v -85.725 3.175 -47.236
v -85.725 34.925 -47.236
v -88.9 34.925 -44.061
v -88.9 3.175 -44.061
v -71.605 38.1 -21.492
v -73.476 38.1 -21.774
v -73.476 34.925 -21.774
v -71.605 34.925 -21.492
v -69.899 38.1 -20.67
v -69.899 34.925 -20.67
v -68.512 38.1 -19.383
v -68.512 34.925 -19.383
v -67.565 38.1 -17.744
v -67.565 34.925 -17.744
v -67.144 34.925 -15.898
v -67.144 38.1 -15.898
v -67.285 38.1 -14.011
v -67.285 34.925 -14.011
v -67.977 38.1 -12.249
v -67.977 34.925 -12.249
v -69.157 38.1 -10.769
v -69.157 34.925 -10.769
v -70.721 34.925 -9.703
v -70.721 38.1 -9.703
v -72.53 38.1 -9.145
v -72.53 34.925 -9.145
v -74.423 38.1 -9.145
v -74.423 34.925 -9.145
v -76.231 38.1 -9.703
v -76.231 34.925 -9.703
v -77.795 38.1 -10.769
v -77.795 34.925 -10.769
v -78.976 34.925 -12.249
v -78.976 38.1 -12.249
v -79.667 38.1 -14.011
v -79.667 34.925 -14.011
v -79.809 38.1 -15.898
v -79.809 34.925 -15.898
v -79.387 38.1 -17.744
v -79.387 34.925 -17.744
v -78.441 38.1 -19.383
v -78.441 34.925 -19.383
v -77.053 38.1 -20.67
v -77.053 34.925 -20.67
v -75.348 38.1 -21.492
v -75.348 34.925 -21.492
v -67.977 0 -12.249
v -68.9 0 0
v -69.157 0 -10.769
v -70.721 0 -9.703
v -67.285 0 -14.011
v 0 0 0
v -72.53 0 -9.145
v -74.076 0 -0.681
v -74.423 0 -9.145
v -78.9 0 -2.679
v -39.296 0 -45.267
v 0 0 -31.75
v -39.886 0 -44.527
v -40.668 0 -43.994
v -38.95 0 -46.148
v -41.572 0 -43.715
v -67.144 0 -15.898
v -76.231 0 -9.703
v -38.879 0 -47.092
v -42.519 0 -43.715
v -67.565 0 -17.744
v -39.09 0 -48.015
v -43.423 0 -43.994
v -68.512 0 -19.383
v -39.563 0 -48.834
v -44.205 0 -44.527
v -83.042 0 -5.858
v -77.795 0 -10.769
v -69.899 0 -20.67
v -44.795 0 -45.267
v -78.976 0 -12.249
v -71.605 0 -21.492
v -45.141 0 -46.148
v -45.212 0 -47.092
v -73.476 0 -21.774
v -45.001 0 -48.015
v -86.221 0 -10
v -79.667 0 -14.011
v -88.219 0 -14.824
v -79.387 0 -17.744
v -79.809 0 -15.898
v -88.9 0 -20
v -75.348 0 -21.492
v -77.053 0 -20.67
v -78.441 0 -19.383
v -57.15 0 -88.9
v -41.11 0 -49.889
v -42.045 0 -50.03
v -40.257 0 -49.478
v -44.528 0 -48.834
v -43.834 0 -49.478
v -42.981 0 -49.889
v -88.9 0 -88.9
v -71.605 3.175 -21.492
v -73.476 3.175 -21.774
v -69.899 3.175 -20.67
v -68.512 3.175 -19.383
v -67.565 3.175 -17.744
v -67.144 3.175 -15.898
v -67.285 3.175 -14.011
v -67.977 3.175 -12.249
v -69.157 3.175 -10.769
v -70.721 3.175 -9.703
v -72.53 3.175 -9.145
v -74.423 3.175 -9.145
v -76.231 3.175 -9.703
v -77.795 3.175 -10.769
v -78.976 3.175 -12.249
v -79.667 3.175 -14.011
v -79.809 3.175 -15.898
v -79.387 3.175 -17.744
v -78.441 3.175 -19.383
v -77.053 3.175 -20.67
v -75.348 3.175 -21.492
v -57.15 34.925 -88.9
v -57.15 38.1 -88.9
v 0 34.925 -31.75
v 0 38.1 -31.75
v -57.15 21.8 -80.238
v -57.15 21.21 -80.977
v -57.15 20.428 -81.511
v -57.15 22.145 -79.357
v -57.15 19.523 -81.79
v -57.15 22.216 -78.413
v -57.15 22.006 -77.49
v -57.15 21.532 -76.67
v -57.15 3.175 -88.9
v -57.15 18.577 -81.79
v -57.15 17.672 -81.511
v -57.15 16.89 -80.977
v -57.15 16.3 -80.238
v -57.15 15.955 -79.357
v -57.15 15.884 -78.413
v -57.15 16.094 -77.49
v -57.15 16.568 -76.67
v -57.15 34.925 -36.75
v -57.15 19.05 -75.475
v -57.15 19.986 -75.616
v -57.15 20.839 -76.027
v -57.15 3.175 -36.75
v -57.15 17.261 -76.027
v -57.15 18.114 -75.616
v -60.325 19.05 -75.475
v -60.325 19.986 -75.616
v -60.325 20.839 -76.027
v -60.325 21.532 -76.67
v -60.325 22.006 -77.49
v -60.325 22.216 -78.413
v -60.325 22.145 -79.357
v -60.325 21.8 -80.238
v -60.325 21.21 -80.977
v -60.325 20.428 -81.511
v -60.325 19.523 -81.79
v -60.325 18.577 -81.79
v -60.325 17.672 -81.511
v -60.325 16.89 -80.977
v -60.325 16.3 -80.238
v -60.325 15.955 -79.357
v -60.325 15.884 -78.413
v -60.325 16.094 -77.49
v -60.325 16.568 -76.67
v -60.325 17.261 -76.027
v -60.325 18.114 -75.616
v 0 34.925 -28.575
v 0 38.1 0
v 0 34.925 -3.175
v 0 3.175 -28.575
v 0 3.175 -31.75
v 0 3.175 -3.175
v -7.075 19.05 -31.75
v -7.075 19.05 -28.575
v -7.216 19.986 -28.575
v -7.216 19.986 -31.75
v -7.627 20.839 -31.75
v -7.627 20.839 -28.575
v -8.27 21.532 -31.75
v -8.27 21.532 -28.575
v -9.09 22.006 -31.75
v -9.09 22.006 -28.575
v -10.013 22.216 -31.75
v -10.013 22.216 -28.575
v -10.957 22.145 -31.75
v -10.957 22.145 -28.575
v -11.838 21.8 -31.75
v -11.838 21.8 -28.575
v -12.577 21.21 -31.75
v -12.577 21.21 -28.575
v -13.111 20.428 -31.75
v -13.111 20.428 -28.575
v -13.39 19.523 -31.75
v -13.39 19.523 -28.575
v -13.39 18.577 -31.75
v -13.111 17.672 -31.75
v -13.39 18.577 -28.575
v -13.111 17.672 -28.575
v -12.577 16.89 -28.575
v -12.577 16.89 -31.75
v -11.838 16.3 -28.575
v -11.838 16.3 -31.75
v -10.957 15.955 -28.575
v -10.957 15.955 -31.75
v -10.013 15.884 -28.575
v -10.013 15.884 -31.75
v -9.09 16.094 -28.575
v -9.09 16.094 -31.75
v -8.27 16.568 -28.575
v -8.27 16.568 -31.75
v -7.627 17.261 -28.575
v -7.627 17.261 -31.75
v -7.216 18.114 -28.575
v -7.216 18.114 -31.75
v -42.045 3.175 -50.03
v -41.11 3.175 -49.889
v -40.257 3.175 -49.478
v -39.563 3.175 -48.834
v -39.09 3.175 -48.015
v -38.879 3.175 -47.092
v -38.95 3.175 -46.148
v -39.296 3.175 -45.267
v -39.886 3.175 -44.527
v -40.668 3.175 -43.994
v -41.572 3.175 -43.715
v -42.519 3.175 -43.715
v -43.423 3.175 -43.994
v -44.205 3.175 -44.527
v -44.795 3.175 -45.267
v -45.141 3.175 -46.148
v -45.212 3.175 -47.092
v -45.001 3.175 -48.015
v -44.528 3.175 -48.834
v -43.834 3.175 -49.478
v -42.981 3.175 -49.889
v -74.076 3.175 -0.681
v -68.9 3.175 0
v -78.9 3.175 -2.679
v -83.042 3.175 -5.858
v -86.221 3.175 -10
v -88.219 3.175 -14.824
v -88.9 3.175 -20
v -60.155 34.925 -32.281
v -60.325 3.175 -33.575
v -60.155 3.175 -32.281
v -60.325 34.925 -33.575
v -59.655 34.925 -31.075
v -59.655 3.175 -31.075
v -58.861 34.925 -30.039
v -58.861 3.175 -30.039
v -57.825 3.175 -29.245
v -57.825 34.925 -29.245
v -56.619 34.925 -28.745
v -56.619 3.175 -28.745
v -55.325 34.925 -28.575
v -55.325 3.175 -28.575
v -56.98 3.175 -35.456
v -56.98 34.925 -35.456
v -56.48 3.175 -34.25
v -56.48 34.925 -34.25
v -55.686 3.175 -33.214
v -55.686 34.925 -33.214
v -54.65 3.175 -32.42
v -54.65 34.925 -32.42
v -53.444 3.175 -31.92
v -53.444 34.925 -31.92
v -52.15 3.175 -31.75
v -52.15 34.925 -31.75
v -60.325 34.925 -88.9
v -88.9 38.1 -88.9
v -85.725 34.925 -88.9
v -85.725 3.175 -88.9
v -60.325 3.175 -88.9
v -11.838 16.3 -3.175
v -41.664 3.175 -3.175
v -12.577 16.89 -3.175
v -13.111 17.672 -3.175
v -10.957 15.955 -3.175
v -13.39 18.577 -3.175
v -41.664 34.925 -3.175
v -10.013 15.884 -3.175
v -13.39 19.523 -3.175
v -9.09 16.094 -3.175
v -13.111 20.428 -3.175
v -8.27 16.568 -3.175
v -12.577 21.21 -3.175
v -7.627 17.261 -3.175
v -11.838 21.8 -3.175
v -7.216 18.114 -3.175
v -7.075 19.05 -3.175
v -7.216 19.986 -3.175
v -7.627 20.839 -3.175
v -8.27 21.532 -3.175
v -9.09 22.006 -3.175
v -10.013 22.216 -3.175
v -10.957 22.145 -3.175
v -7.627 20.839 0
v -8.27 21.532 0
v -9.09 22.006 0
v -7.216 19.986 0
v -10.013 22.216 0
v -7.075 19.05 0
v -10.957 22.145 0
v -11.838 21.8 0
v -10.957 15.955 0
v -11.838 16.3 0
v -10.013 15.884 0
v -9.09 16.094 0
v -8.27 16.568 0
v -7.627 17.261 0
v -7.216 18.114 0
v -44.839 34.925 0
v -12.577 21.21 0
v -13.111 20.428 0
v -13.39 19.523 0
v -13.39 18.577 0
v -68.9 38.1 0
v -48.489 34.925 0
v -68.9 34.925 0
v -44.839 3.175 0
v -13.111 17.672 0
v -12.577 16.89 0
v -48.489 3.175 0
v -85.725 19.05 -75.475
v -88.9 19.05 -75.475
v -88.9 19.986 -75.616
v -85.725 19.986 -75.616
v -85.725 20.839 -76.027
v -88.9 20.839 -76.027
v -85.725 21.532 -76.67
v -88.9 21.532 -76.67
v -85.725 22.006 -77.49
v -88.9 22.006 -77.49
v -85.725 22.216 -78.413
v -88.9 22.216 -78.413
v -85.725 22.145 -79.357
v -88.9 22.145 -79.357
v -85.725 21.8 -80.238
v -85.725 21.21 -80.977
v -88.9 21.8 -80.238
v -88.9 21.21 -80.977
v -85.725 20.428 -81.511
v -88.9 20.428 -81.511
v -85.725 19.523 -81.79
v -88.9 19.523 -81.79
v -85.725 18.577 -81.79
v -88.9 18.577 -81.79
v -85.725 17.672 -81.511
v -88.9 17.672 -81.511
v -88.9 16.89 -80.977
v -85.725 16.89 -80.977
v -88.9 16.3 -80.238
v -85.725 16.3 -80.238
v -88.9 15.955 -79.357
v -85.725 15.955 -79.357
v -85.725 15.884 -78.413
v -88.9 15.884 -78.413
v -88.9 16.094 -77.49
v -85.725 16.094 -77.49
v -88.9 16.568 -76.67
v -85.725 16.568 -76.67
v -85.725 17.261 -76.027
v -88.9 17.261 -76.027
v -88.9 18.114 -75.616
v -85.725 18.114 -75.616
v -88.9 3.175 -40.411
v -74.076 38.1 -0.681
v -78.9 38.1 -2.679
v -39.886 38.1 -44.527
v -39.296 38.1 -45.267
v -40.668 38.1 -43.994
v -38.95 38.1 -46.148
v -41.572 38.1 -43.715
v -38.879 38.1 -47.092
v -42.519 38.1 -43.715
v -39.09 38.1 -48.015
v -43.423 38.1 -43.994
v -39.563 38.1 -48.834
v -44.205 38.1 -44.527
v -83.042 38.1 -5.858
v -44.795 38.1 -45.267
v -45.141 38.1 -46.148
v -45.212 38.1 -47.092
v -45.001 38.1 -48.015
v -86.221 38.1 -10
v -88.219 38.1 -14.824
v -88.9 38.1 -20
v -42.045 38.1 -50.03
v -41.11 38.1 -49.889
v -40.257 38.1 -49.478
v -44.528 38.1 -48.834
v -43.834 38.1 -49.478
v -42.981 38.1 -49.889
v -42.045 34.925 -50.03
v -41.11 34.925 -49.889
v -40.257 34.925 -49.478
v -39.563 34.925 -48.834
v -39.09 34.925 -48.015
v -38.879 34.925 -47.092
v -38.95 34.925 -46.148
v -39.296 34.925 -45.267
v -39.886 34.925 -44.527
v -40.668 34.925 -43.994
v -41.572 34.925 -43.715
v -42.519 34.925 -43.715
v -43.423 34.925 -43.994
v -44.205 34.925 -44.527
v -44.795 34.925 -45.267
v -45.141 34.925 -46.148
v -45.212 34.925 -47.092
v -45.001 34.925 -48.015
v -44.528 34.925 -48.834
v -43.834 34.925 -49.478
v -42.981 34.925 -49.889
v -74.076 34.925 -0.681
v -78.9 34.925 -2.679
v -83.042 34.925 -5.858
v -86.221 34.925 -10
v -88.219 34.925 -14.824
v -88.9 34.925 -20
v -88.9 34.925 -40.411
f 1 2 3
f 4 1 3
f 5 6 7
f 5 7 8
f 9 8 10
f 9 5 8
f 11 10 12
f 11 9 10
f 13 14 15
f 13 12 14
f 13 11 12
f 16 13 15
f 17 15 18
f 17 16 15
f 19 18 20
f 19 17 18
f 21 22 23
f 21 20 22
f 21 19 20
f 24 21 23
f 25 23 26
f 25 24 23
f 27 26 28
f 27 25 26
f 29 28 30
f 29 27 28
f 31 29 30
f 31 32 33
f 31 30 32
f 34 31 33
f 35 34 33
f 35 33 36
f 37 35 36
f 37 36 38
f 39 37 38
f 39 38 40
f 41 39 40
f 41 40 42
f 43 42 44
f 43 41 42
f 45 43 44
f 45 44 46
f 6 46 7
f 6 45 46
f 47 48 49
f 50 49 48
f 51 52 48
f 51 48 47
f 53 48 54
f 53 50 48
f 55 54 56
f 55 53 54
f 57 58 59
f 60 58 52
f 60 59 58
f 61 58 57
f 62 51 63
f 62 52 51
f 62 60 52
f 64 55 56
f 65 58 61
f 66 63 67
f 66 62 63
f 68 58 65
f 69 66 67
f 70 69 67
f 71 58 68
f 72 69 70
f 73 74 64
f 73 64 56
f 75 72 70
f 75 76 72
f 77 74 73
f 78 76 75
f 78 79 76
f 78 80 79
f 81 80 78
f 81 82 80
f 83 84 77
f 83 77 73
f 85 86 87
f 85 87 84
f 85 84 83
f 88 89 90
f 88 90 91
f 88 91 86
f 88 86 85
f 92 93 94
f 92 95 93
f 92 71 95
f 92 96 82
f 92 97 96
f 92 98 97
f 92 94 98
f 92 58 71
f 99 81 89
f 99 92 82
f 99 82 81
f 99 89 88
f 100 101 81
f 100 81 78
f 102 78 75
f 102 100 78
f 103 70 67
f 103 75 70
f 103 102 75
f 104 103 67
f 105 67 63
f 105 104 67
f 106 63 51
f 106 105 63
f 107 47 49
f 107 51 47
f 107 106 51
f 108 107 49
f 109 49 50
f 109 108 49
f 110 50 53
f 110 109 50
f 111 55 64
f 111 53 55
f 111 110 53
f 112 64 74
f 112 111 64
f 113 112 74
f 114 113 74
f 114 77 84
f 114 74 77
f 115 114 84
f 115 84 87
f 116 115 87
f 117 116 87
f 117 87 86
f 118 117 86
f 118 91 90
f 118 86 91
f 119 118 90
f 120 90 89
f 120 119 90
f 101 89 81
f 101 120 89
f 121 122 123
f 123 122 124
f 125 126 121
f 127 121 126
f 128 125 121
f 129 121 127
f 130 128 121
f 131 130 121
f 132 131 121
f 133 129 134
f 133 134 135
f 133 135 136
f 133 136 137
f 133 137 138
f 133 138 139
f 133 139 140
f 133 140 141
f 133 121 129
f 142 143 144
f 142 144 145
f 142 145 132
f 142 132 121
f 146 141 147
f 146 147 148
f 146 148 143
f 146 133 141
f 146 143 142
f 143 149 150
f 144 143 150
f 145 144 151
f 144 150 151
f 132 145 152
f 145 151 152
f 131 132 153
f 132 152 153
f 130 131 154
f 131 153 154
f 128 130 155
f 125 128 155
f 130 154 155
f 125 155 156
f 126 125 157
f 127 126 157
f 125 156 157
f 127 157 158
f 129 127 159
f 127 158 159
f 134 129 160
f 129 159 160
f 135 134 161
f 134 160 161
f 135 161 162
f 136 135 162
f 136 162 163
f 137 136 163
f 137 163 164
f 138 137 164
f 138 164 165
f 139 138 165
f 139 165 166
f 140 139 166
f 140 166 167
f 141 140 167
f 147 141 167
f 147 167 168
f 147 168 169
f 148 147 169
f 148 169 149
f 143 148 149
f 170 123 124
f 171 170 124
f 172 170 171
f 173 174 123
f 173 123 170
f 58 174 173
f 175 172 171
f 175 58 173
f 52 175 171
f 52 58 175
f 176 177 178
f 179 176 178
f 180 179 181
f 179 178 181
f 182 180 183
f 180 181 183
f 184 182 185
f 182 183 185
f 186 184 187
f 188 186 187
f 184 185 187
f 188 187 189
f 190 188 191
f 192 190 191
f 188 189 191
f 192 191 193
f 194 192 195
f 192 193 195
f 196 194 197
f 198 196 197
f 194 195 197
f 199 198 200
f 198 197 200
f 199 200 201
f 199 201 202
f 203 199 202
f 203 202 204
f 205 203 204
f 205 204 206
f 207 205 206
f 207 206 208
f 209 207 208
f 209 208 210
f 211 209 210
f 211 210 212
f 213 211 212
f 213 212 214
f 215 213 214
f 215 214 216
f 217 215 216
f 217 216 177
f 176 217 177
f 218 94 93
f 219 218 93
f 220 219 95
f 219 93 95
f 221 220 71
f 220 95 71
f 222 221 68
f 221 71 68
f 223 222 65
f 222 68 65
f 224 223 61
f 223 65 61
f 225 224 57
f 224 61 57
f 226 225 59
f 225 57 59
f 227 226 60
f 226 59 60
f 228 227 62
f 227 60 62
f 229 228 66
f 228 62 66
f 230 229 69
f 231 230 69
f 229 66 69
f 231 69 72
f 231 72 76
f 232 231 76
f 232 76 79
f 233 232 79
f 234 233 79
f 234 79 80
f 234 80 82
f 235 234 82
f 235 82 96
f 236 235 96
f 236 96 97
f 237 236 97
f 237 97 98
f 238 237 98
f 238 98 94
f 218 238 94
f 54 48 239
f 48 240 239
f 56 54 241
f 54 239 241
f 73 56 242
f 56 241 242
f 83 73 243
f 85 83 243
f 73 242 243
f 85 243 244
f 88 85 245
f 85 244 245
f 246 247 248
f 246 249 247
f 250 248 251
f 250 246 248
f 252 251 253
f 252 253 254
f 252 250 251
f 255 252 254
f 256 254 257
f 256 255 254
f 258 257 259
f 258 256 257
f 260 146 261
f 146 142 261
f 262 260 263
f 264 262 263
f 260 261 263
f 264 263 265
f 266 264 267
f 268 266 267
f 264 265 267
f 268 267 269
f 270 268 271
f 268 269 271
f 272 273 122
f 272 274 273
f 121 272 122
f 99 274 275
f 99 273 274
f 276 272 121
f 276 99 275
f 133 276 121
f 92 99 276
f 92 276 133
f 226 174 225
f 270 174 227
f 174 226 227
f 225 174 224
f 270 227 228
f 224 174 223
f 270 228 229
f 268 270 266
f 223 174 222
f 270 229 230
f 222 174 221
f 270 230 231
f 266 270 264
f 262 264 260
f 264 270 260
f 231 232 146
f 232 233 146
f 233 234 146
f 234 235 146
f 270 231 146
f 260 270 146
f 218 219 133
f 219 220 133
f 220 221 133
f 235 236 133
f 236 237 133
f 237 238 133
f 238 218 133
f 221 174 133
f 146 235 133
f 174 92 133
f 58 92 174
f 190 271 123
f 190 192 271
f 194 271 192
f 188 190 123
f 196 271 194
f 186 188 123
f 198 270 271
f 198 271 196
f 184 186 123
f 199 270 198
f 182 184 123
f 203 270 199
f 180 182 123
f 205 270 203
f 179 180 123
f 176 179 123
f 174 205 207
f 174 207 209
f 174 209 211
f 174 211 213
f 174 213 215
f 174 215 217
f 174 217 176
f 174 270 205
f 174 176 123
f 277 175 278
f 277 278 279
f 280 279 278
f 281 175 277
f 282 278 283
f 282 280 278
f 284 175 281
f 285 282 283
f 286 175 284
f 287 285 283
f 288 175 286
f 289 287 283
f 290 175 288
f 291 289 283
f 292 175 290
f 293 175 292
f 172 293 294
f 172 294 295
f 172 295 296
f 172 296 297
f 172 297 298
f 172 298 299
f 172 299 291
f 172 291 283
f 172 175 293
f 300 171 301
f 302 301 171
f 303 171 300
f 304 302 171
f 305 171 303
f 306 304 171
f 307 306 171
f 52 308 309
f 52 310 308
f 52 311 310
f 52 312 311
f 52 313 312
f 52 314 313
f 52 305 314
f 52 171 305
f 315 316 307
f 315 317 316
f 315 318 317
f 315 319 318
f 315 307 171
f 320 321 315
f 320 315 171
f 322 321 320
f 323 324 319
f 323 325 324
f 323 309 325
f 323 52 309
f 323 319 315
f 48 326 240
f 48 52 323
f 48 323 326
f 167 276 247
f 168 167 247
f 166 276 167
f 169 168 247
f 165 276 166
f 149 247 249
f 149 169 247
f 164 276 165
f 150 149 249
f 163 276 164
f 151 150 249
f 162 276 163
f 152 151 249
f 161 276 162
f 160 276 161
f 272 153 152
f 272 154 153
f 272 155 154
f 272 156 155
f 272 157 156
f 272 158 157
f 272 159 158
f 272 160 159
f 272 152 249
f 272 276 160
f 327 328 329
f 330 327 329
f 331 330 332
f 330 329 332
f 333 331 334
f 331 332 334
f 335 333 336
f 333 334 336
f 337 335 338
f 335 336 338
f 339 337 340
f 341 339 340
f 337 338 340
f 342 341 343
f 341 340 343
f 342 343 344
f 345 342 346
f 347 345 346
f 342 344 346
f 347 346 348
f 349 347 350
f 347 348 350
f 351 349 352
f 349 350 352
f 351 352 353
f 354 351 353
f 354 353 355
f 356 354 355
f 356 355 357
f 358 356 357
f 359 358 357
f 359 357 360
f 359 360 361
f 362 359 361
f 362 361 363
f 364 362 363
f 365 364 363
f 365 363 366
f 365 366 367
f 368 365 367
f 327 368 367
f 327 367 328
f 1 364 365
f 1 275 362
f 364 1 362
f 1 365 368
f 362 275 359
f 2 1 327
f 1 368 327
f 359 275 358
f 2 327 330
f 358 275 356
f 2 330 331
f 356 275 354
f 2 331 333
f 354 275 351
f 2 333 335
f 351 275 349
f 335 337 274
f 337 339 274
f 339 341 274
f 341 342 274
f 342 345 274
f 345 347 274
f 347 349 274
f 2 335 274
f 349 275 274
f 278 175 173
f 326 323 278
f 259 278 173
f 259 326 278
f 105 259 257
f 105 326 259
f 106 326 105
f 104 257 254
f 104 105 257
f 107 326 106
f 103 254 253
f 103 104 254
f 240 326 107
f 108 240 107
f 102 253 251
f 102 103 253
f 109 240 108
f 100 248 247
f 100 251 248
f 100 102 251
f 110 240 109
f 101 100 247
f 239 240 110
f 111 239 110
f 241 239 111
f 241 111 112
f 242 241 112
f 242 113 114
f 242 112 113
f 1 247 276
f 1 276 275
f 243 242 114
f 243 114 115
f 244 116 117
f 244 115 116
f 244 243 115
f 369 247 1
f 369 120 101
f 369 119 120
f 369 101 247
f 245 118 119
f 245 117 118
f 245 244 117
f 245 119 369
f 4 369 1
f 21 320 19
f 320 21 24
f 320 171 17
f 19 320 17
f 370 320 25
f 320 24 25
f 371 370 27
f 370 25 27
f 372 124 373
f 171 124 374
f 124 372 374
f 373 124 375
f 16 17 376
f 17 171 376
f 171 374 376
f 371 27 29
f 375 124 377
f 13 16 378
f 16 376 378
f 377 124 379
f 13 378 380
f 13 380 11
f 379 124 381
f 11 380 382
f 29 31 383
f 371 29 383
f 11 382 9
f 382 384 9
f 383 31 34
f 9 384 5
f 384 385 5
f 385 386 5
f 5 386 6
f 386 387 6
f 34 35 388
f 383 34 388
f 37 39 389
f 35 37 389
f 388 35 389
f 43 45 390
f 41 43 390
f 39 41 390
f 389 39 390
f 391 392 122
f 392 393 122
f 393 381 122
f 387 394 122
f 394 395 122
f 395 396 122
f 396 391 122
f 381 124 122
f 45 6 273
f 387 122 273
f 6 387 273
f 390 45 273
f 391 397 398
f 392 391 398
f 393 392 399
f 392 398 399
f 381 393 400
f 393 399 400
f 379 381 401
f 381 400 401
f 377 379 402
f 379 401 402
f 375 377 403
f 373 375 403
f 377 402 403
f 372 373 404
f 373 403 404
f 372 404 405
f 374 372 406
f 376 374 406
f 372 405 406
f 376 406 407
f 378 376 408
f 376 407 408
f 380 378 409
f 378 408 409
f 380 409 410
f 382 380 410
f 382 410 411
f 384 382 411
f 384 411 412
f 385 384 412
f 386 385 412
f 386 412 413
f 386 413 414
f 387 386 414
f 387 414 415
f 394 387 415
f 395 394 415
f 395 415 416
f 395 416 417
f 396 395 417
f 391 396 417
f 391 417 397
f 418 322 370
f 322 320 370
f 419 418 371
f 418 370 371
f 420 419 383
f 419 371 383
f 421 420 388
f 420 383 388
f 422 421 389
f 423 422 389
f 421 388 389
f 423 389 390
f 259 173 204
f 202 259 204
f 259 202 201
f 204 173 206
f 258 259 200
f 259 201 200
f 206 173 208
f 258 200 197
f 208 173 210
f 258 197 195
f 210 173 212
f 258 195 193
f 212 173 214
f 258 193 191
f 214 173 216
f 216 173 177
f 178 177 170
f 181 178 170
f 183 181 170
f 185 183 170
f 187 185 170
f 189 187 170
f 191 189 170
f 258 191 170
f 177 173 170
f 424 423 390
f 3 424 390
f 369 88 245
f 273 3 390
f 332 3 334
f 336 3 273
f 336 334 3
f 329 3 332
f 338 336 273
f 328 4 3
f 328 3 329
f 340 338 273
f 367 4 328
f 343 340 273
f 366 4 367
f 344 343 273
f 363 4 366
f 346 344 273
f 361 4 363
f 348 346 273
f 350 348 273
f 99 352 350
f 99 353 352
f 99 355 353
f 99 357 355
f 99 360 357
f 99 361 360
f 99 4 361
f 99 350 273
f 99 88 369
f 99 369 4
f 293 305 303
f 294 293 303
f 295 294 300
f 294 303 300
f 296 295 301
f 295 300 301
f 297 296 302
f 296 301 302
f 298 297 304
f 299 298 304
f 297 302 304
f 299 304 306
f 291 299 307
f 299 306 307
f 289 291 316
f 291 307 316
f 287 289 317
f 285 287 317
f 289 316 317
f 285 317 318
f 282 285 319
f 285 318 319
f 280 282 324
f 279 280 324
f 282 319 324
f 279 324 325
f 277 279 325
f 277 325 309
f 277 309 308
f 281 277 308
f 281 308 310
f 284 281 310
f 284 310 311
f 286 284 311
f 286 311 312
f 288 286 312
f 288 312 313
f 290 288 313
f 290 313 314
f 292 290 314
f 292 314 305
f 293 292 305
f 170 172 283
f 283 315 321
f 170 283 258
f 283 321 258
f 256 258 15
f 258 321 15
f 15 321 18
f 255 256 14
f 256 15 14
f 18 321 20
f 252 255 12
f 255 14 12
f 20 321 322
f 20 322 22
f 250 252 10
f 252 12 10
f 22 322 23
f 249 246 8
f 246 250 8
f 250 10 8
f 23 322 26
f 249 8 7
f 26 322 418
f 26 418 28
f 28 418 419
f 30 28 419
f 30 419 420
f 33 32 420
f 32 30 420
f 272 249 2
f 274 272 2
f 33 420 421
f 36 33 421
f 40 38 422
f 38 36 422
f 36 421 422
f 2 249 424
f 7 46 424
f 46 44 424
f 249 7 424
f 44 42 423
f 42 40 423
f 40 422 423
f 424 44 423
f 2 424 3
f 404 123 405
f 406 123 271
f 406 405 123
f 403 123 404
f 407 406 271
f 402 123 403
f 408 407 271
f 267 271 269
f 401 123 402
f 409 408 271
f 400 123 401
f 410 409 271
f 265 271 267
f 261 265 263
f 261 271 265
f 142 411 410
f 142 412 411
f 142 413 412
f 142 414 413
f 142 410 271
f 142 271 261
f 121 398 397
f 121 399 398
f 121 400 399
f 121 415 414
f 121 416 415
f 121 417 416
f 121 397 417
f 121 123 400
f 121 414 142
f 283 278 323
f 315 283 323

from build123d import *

# Parameters (mm, degrees)
BOSS_EXTRUDE1_DEPTH     = 38.1
SKETCH2_W               = 25.4
SKETCH2_H               = 31.75
CUT_EXTRUDE1_DEPTH      = 88.9
CUT_EXTRUDE2_REACH      = 133.37
SKETCH3_W               = 25.4
SKETCH3_H               = 31.75
CUT_EXTRUDE3_START      = -62.861793
SKETCH4_W               = 75
SKETCH4_H               = 31.75
CUT_EXTRUDE3_DEPTH      = 28.575
FILLET4_R               = 20
CUT_EXTRUDE8_DEPTH      = 131.484388453
CUT_EXTRUDE8_DEPTH_BACK = 131.484388453
SKETCH8_R               = 6.35
BOSS_EXTRUDE2_DEPTH     = 3.175
CUT_EXTRUDE10_REACH     = 133.37
SKETCH35_R              = 3.175
CUT_EXTRUDE11_REACH     = 133.37
SKETCH36_R              = 3.175
FILLET8_R               = 5
CHAMFER1_SIZE           = 10
CHAMFER1_SIZE_2         = 7.071067812
CUT_EXTRUDE12_REACH     = 133.37
SKETCH37_R              = 3.175


with BuildPart() as part:
    # Sketch1 → Boss-Extrude1 (new body)
    with BuildSketch(Plane(origin=(0, 0, 0), x_dir=(1, 0, 0), z_dir=(0, 1, 0))):
        Polygon((0, 0), (-88.9, 0), (-88.9, 88.9), (-57.15, 88.9), (-57.15, 31.75), (0, 31.75), align=None)
    extrude(amount=BOSS_EXTRUDE1_DEPTH)

    # Sketch2 → Cut-Extrude1 (cut)
    with BuildSketch(Plane(origin=(0, 0, 0), x_dir=(0, 0, -1), z_dir=(1, 0, 0))):
        with Locations((15.875, 19.05)):
            Rectangle(SKETCH2_W, SKETCH2_H)
    extrude(amount=-CUT_EXTRUDE1_DEPTH, mode=Mode.SUBTRACT)

    # Cut-Extrude2: up to this face of the body (flat: up to its plane)
    cut_extrude2_end = Plane(part.part.faces().sort_by_distance((-44.45, 19.05, 0))[0])
    # Sketch3 → Cut-Extrude2 (cut, up to the picked face)
    with BuildSketch(Plane(origin=(0, 0, -88.9), x_dir=(-1, 0, 0), z_dir=(0, 0, -1)), mode=Mode.PRIVATE) as cut_extrude2_sk1:
        with Locations((73.025, 19.05)):
            Rectangle(SKETCH3_W, SKETCH3_H)
    cut_extrude2_tool1 = split(extrude(cut_extrude2_sk1.sketch, amount=-CUT_EXTRUDE2_REACH, mode=Mode.PRIVATE), bisect_by=cut_extrude2_end, keep=Keep.BOTH, mode=Mode.PRIVATE)
    add(cut_extrude2_tool1.solids().sort_by(Axis((-73.025, 19.05, -88.9), (0, 0, 1)))[0], mode=Mode.SUBTRACT)

    # Sketch4 → Cut-Extrude3 (cut)
    with BuildSketch(Plane(origin=(0, 0, 0), x_dir=(-0.7071067811865475, 0, -0.7071067811865476), z_dir=(0.7071067811865476, 0, -0.7071067811865475)).offset(CUT_EXTRUDE3_START)):
        with Locations((62.861792847, 19.05)):
            Rectangle(SKETCH4_W, SKETCH4_H)
    extrude(amount=CUT_EXTRUDE3_DEPTH, mode=Mode.SUBTRACT)

    # Fillet4
    fillet4_edges = [part.edges().sort_by_distance(p)[0] for p in [
        (-88.9, 36.5125, 0),
        (-88.9, 1.5875, 0),
    ]]
    fillet(fillet4_edges, radius=FILLET4_R)

    # Sketch8 → Cut-Extrude8 (cut, two sides: drawn at the far end of the back side and taken through both)
    with BuildSketch(Plane.XZ.offset(-34.925).offset(-CUT_EXTRUDE8_DEPTH_BACK)):
        with Locations(Location((-73.476280605, -15.423719395, 0), (0, 0, 270))):
            Circle(SKETCH8_R)
    extrude(amount=CUT_EXTRUDE8_DEPTH + CUT_EXTRUDE8_DEPTH_BACK, mode=Mode.SUBTRACT)

    # Sketch29 → Boss-Extrude2 (add)
    with BuildSketch(Plane(origin=(0, 38.1, 0), x_dir=(1, 0, 0), z_dir=(0, 1, 0))):
        Polygon((-57.15, 88.9), (0, 31.75), (-57.15, 31.75), align=None)
    boss_extrude2 = extrude(amount=-BOSS_EXTRUDE2_DEPTH)

    # Cut-Extrude10: up to this face of the body (flat: up to its plane)
    cut_extrude10_end = Plane(part.part.faces().sort_by_distance((-57.15, 17.4625, -60.325))[0])
    # Sketch35 → Cut-Extrude10 (cut, up to the picked face)
    with BuildSketch(Plane.ZY.offset(88.9), mode=Mode.PRIVATE) as cut_extrude10_sk1:
        with Locations((-78.65, 19.05)):
            Circle(SKETCH35_R)
    cut_extrude10_tool1 = split(extrude(cut_extrude10_sk1.sketch, amount=-CUT_EXTRUDE10_REACH, mode=Mode.PRIVATE), bisect_by=cut_extrude10_end, keep=Keep.BOTH, mode=Mode.PRIVATE)
    add(cut_extrude10_tool1.solids().sort_by(Axis((-88.9, 19.05, -78.65), (1, 0, 0)))[0], mode=Mode.SUBTRACT)

    # Cut-Extrude11: up to this face of the body (flat: up to its plane)
    cut_extrude11_end = Plane(part.part.faces().sort_by_distance((-28.575, 17.4625, -31.75))[0])
    # Sketch36 → Cut-Extrude11 (cut, up to the picked face)
    with BuildSketch(Plane.XY, mode=Mode.PRIVATE) as cut_extrude11_sk1:
        with Locations((-10.25, 19.05)):
            Circle(SKETCH36_R)
    cut_extrude11_tool1 = split(extrude(cut_extrude11_sk1.sketch, amount=-CUT_EXTRUDE11_REACH, mode=Mode.PRIVATE), bisect_by=cut_extrude11_end, keep=Keep.BOTH, mode=Mode.PRIVATE)
    add(cut_extrude11_tool1.solids().sort_by(Axis((-10.25, 19.05, 0), (0, 0, -1)))[0], mode=Mode.SUBTRACT)

    # Mirror1: Boss-Extrude2 across plane
    add(boss_extrude2.mirror(Plane(origin=(0, 19.05, 0), x_dir=(0, 0, 1), z_dir=(0, -1, 0))))

    # Fillet8
    fillet8_edges = [part.edges().sort_by_distance(p)[0] for p in [
        (-57.15, 19.05, -31.75),
        (-60.325, 19.05, -28.575),
    ]]
    fillet(fillet8_edges, radius=FILLET8_R)

    # Chamfer1
    # the kernel refuses this chamfer: 10, 7.071067812 mm, written as the material it takes off along each edge
    with BuildSketch(Plane(origin=(-51.663847671, 3.175, -3.175), x_dir=(0.9996219169112968, 0, -0.027495876610586317), z_dir=(0, 1, 0)), Plane(origin=(-85.725, 34.925, -37.236152329), x_dir=(0.027495876610586317, 0, -0.9996219169112968), z_dir=(0, -1, 0))) as chamfer1_piece_1:
        Polygon((CHAMFER1_SIZE * 0.999621916911, -CHAMFER1_SIZE * 0.0274958766106), (CHAMFER1_SIZE_2 * 0.687396915252, -CHAMFER1_SIZE_2 * 0.726281956863), (0, 0), align=None)
    extrude(amount=31.75, mode=Mode.SUBTRACT)

    # Cut-Extrude12: up to this face of the body (flat: up to its plane)
    cut_extrude12_end = Plane(part.part.faces().sort_by_distance((-50.123943702, 38.1, -38.776056298))[0])
    # Sketch37 → Cut-Extrude12 (cut, up to the picked face)
    with BuildSketch(Plane.XZ, mode=Mode.PRIVATE) as cut_extrude12_sk1:
        with Locations(Location((-42.045384182, -46.854615818, 0), (0, 0, 270))):
            Circle(SKETCH37_R)
    cut_extrude12_tool1 = split(extrude(cut_extrude12_sk1.sketch, amount=-CUT_EXTRUDE12_REACH, mode=Mode.PRIVATE), bisect_by=cut_extrude12_end, keep=Keep.BOTH, mode=Mode.PRIVATE)
    add(cut_extrude12_tool1.solids().sort_by(Axis((-42.045384, 0, -46.854616), (0, 1, 0)))[0], mode=Mode.SUBTRACT)


solid = part.part
